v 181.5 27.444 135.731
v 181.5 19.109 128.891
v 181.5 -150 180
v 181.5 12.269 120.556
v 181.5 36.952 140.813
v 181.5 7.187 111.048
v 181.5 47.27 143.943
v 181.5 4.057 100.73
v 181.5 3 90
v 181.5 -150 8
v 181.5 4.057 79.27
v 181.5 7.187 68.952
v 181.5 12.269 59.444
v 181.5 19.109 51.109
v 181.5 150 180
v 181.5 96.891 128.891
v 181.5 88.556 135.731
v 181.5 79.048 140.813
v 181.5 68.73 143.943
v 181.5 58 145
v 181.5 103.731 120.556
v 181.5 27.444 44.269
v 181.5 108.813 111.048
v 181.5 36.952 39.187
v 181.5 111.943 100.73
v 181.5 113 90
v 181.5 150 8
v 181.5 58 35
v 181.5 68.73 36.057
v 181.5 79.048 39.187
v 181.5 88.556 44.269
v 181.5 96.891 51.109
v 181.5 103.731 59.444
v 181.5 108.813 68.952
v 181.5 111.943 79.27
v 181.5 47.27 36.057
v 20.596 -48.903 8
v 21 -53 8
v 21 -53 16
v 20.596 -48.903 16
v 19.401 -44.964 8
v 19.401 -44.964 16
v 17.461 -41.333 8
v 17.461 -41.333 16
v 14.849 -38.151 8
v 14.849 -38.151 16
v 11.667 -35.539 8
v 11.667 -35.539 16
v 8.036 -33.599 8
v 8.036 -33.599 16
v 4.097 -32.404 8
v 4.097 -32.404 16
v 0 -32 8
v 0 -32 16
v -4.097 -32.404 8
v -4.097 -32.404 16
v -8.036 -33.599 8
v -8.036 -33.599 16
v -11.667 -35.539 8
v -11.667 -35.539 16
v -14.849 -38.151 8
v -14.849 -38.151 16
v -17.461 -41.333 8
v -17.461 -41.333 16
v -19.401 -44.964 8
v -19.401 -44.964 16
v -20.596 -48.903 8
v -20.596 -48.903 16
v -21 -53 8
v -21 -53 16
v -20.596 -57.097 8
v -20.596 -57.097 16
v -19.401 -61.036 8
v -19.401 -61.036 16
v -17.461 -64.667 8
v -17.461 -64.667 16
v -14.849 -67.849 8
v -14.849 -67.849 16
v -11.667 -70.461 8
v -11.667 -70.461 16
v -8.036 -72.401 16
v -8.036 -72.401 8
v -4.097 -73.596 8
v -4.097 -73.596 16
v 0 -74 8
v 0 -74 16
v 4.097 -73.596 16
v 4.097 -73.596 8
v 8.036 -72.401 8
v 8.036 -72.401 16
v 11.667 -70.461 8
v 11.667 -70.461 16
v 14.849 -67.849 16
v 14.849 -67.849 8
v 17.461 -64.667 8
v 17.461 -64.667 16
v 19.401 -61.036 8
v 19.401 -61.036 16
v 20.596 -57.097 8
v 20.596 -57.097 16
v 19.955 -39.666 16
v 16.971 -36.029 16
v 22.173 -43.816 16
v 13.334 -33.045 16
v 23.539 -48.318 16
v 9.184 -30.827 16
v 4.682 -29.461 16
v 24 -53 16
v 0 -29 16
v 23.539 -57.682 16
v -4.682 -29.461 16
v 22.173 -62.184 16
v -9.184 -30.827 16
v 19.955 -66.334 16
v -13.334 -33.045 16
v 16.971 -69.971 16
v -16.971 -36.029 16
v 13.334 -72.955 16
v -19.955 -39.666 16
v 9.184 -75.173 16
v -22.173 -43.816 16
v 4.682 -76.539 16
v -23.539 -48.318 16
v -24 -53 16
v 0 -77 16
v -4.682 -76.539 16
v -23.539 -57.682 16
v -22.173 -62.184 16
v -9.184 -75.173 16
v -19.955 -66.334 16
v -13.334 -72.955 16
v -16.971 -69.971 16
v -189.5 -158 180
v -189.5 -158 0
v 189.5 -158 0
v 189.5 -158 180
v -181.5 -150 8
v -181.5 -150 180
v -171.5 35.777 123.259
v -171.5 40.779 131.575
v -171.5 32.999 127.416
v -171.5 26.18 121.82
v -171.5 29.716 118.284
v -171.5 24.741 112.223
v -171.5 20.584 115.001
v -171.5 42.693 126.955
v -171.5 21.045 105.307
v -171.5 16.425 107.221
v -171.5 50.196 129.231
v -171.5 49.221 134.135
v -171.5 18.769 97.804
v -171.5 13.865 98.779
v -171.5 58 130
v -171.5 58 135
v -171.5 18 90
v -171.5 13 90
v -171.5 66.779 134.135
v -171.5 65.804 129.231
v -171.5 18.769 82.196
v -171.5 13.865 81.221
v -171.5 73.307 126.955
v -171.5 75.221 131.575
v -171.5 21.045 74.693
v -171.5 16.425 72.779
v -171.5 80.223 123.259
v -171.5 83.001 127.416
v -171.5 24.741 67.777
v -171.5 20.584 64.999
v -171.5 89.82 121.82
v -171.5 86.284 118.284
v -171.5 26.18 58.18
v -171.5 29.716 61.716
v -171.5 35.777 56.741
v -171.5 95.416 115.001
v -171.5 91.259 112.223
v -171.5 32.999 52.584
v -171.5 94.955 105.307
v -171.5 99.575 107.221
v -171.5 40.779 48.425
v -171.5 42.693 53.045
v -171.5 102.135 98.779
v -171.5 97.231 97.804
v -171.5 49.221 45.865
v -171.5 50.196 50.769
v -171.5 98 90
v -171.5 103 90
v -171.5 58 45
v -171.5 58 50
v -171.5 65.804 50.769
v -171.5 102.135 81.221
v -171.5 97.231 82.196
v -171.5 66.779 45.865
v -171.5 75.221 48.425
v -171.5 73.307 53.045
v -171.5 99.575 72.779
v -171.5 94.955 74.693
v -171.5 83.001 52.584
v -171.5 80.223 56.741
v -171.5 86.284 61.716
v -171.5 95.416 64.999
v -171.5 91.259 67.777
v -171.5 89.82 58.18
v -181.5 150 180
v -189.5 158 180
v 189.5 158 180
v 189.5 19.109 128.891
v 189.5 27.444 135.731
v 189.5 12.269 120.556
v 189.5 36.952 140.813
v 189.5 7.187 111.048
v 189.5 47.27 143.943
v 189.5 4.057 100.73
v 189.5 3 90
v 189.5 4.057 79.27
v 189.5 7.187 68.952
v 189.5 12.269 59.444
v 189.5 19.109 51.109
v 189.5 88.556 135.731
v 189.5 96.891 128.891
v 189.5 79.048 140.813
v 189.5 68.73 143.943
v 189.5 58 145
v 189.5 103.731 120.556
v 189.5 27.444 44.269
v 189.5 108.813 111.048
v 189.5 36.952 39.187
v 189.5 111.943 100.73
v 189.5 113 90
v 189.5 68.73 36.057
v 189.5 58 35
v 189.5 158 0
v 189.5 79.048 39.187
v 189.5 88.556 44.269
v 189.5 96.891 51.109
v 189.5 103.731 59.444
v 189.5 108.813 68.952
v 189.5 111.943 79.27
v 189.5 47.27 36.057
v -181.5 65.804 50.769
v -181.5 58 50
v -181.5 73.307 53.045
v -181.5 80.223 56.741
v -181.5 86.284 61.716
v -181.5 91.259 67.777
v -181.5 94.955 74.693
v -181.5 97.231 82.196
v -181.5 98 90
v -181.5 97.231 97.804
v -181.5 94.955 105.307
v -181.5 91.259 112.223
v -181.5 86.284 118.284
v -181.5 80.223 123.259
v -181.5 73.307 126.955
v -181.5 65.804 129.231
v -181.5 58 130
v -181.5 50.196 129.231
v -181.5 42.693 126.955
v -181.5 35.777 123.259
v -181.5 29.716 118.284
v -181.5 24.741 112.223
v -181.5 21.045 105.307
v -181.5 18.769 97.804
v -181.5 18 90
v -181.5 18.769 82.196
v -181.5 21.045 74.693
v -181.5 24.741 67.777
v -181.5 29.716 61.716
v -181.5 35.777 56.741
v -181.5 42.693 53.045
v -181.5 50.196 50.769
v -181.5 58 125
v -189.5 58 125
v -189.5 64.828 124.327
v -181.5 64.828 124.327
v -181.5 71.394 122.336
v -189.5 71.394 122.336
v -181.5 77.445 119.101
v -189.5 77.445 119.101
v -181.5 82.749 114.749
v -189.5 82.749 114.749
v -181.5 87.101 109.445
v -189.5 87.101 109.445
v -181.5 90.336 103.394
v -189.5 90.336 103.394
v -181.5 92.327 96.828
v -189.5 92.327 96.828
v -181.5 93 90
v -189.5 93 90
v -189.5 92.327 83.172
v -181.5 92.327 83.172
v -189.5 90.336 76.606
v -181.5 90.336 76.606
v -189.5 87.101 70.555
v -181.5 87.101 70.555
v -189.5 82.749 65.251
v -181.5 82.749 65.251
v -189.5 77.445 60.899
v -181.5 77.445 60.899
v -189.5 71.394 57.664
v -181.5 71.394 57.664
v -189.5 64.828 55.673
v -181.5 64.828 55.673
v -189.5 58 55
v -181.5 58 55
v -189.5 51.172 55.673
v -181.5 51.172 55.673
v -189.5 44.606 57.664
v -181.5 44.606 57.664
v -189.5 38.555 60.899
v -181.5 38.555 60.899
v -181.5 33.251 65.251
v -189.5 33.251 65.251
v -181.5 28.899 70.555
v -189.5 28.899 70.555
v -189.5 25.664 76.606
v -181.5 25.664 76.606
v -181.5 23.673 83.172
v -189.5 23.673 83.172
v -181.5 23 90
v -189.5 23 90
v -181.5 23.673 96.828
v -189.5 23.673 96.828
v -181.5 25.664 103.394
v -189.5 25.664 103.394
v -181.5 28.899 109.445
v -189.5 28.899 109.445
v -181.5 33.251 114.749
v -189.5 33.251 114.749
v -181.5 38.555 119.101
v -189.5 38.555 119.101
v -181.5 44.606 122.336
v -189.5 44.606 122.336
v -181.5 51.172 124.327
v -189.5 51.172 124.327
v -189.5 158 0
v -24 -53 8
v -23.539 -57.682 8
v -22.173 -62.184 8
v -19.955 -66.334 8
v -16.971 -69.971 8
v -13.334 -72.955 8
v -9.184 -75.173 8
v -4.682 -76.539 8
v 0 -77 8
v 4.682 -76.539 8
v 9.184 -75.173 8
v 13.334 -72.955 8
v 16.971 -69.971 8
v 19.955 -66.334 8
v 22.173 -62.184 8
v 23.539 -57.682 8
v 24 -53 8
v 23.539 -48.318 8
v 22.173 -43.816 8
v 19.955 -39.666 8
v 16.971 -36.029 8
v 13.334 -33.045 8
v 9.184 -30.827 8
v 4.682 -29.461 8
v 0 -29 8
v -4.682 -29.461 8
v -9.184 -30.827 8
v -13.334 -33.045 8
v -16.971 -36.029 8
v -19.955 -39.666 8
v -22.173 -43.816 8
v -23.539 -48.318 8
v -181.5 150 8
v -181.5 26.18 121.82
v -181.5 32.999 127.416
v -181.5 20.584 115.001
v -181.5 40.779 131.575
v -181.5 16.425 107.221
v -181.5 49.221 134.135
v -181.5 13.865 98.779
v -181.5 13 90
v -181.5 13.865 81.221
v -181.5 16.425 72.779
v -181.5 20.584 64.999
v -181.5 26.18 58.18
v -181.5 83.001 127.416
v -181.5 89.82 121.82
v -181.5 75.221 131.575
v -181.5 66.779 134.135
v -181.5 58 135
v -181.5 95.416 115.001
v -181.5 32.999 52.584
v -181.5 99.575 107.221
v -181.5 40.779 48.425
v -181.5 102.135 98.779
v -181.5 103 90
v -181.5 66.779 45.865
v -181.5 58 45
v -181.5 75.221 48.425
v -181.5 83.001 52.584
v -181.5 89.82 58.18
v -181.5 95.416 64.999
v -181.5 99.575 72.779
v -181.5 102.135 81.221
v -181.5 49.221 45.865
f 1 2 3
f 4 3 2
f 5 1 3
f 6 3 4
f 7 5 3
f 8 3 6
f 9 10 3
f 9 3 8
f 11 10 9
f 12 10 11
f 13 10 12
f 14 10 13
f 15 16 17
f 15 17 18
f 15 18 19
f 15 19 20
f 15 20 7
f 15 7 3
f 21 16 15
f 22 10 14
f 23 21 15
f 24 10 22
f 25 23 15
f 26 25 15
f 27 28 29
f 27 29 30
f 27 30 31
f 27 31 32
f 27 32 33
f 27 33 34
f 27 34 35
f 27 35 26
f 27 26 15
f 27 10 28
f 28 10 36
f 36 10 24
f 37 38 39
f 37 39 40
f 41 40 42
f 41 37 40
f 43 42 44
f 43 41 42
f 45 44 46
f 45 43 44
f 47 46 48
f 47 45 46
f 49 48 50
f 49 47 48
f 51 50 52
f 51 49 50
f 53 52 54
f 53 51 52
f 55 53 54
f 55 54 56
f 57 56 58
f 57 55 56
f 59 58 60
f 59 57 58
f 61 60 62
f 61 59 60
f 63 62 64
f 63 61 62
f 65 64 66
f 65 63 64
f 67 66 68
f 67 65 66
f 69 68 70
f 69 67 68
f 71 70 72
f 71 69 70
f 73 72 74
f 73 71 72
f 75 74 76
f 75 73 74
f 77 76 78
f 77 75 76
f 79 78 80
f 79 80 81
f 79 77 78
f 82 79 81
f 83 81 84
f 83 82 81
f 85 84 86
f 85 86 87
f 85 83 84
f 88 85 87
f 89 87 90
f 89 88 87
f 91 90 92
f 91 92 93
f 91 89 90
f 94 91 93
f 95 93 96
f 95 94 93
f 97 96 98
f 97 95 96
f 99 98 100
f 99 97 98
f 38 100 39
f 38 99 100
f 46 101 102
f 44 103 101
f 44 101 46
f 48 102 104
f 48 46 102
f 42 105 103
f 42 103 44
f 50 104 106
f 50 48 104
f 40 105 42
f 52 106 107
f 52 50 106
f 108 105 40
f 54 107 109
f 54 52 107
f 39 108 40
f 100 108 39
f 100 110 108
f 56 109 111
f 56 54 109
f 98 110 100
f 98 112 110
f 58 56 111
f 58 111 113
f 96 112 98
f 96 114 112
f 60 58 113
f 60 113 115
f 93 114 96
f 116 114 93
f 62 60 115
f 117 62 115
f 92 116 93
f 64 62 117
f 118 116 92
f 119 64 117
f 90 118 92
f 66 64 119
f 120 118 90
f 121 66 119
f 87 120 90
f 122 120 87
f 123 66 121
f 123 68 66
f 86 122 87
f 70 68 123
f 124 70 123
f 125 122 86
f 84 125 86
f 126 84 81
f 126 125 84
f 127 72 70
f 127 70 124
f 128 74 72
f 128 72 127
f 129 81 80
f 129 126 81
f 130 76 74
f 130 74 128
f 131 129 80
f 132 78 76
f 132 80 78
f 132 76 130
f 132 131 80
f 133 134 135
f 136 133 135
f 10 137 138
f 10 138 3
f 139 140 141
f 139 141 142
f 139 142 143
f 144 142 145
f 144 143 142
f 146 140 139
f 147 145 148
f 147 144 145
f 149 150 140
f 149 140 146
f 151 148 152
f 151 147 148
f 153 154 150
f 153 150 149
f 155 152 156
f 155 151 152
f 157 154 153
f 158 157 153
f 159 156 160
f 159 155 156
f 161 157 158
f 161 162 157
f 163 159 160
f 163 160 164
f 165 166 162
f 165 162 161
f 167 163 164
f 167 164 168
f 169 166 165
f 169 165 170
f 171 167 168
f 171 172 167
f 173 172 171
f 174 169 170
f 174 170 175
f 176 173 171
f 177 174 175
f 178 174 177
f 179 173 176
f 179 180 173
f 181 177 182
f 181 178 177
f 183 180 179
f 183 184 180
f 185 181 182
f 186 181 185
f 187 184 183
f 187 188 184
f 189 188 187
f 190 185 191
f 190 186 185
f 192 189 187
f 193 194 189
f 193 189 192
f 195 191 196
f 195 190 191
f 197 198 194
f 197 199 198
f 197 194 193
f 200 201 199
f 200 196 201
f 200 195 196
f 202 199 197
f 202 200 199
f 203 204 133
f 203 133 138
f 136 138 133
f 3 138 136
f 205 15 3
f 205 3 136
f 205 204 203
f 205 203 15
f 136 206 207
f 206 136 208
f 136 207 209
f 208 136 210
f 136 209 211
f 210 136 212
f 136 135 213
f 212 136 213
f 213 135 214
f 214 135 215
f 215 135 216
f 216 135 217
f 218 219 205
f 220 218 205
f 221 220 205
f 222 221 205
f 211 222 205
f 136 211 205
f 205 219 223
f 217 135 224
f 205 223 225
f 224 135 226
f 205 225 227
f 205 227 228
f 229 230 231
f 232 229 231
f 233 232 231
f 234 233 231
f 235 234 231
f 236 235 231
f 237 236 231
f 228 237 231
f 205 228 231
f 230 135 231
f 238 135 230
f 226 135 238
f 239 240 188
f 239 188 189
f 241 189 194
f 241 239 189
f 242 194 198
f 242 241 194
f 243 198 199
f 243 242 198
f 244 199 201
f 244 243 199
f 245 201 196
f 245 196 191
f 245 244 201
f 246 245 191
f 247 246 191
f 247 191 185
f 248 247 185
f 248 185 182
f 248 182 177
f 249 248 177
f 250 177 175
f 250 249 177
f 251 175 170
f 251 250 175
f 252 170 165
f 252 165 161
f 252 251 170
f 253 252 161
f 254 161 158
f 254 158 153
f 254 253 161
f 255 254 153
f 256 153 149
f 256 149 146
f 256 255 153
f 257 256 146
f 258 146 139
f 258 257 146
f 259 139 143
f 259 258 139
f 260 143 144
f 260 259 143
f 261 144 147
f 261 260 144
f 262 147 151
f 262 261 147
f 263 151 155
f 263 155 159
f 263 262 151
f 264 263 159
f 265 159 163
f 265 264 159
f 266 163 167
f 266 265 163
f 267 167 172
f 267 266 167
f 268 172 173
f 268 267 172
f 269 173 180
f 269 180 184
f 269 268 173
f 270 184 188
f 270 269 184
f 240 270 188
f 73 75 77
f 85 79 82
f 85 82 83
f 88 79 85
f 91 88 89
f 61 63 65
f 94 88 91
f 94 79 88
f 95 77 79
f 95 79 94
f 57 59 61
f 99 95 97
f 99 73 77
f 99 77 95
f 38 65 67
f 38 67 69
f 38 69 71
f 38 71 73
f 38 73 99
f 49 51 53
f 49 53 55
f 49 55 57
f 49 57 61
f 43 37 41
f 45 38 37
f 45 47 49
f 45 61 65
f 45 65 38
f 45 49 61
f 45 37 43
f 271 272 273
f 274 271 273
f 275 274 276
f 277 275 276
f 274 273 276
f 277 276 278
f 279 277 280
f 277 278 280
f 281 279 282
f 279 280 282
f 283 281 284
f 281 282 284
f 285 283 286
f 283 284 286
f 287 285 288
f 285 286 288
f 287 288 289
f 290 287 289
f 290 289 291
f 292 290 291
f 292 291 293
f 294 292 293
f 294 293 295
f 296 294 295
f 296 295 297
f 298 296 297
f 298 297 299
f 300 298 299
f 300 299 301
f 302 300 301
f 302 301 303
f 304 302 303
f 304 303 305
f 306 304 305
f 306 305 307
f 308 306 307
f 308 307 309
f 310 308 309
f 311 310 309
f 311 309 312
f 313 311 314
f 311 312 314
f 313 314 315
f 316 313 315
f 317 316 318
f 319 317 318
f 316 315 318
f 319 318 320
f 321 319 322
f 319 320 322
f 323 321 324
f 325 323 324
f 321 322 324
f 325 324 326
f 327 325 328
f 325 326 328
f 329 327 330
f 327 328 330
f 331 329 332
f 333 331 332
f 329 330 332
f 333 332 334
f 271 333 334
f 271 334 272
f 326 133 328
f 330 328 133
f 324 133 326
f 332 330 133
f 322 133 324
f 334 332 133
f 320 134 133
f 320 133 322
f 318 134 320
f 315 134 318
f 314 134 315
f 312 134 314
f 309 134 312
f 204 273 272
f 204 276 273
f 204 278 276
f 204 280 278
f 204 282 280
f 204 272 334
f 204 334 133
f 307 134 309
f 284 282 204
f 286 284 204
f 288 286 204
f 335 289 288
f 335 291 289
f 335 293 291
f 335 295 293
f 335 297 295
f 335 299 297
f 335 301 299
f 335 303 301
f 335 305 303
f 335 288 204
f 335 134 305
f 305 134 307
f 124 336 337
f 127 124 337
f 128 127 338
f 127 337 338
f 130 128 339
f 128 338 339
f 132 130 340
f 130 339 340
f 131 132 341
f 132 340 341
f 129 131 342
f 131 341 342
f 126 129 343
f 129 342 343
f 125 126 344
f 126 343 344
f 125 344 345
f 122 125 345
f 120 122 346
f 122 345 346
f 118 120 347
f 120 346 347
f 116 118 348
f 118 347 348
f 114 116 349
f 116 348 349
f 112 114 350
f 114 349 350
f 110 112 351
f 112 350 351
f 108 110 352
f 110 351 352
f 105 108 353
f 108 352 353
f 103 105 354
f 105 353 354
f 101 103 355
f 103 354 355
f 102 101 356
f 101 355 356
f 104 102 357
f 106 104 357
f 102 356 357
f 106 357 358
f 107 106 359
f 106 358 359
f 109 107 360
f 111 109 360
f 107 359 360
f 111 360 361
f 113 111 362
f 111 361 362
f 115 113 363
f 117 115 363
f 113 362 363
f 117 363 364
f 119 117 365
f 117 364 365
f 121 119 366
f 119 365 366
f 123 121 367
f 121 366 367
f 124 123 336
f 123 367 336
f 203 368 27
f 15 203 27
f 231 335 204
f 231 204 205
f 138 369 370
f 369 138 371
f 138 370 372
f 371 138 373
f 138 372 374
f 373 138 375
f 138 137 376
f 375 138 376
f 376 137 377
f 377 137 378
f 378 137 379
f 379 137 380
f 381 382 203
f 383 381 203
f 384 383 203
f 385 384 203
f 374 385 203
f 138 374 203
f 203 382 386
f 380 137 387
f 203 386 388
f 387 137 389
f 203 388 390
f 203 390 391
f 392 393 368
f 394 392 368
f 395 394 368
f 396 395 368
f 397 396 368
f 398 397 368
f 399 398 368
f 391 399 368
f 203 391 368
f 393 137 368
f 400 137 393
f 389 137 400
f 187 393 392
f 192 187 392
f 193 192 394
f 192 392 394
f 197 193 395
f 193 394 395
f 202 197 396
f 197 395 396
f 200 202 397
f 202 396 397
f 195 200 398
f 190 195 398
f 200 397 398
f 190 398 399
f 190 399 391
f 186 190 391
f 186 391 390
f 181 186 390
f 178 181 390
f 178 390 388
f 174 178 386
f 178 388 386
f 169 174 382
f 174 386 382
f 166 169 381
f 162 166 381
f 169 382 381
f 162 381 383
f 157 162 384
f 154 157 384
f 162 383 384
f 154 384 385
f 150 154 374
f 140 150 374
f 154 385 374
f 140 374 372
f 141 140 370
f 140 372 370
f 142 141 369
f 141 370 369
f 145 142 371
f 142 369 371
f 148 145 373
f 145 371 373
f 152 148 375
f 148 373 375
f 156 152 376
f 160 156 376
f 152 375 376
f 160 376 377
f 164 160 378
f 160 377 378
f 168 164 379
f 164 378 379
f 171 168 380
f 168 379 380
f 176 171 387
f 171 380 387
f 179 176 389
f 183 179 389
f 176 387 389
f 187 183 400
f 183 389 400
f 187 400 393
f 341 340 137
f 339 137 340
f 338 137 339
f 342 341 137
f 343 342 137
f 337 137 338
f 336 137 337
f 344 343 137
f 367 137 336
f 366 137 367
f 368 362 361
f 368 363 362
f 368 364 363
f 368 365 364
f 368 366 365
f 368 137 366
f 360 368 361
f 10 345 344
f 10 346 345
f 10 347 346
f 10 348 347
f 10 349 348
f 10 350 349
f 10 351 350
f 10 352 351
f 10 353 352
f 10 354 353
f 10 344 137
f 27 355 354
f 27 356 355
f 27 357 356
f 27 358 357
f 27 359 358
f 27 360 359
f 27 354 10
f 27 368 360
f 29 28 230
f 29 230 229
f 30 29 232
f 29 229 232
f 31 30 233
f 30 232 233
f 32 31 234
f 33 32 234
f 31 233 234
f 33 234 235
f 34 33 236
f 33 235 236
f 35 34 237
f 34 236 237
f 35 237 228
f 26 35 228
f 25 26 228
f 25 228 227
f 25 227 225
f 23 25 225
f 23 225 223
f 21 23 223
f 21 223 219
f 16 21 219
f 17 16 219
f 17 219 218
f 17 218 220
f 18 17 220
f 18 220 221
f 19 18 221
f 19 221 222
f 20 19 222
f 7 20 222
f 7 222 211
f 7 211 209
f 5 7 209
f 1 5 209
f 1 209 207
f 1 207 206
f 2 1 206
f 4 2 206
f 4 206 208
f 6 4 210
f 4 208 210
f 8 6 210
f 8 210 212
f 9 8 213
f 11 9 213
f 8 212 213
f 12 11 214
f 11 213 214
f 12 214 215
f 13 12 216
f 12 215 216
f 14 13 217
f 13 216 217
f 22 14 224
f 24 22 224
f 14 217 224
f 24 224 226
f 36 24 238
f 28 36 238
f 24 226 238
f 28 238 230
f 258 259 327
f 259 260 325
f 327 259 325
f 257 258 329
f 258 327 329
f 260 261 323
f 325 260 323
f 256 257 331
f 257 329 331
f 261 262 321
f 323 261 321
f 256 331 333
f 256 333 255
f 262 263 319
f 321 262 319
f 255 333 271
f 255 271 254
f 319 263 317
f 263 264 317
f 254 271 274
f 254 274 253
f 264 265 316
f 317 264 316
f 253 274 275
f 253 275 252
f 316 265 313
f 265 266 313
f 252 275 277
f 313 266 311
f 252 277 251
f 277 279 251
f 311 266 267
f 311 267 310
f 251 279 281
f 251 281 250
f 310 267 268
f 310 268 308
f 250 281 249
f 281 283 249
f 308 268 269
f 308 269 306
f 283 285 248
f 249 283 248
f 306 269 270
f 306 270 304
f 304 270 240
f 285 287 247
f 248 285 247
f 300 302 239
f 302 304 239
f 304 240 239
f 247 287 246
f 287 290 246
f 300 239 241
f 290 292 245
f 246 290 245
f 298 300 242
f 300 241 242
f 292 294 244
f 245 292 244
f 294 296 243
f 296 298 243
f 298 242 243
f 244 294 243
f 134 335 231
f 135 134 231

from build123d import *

# Parameters (mm, degrees)
CROQUIS1_W              = 379
CROQUIS1_H              = 316
SALIENTE_EXTRUIR1_DEPTH = 180
VACIADO1_T              = -8
CROQUIS2_R              = 35
CORTAR_EXTRUIR4_DEPTH   = 20
CROQUIS4_R              = 45
CROQUIS4_R_2            = 40
SALIENTE_EXTRUIR4_DEPTH = 10
CROQUIS6_R              = 55
CORTAR_EXTRUIR6_DEPTH   = 10
CROQUIS7_R              = 24
CROQUIS7_R_2            = 21
SALIENTE_EXTRUIR9_DEPTH = 8


with BuildPart() as part:
    # Croquis1 → Saliente-Extruir1 (new body)
    with BuildSketch(Plane.XY):
        Rectangle(CROQUIS1_W, CROQUIS1_H)
    extrude(amount=SALIENTE_EXTRUIR1_DEPTH)

    # Vaciado1
    vaciado1_openings = [part.faces().sort_by_distance(p)[0] for p in [
        (0, 0, 180),
    ]]
    offset(amount=VACIADO1_T, openings=vaciado1_openings, kind=Kind.INTERSECTION)

    # Croquis2 → Cortar-Extruir4 (cut)
    with BuildSketch(Plane.ZY.offset(189.5)):
        with Locations((90, 58)):
            Circle(CROQUIS2_R)
    extrude(amount=-CORTAR_EXTRUIR4_DEPTH, mode=Mode.SUBTRACT)

    # Croquis4 → Saliente-Extruir4 (add)
    with BuildSketch(Plane(origin=(-181.5, 0, 0), x_dir=(0, 0, -1), z_dir=(1, 0, 0))):
        with Locations((-90, 58)):
            Circle(CROQUIS4_R)
        with Locations((-90, 58)):
            Circle(CROQUIS4_R_2, mode=Mode.SUBTRACT)
    extrude(amount=SALIENTE_EXTRUIR4_DEPTH)

    # Croquis6 → Cortar-Extruir6 (cut)
    with BuildSketch(Plane(origin=(189.5, 0, 0), x_dir=(0, 0, -1), z_dir=(1, 0, 0))):
        with Locations((-90, 58)):
            Circle(CROQUIS6_R)
    extrude(amount=-CORTAR_EXTRUIR6_DEPTH, mode=Mode.SUBTRACT)

    # Croquis7 → Saliente-Extruir9 (add)
    with BuildSketch(Plane.XY.offset(8)):
        with Locations(Location((0, -53, 0), (0, 0, 180))):
            Circle(CROQUIS7_R)
        with Locations((0, -53)):
            Circle(CROQUIS7_R_2, mode=Mode.SUBTRACT)
    extrude(amount=SALIENTE_EXTRUIR9_DEPTH)


solid = part.part
